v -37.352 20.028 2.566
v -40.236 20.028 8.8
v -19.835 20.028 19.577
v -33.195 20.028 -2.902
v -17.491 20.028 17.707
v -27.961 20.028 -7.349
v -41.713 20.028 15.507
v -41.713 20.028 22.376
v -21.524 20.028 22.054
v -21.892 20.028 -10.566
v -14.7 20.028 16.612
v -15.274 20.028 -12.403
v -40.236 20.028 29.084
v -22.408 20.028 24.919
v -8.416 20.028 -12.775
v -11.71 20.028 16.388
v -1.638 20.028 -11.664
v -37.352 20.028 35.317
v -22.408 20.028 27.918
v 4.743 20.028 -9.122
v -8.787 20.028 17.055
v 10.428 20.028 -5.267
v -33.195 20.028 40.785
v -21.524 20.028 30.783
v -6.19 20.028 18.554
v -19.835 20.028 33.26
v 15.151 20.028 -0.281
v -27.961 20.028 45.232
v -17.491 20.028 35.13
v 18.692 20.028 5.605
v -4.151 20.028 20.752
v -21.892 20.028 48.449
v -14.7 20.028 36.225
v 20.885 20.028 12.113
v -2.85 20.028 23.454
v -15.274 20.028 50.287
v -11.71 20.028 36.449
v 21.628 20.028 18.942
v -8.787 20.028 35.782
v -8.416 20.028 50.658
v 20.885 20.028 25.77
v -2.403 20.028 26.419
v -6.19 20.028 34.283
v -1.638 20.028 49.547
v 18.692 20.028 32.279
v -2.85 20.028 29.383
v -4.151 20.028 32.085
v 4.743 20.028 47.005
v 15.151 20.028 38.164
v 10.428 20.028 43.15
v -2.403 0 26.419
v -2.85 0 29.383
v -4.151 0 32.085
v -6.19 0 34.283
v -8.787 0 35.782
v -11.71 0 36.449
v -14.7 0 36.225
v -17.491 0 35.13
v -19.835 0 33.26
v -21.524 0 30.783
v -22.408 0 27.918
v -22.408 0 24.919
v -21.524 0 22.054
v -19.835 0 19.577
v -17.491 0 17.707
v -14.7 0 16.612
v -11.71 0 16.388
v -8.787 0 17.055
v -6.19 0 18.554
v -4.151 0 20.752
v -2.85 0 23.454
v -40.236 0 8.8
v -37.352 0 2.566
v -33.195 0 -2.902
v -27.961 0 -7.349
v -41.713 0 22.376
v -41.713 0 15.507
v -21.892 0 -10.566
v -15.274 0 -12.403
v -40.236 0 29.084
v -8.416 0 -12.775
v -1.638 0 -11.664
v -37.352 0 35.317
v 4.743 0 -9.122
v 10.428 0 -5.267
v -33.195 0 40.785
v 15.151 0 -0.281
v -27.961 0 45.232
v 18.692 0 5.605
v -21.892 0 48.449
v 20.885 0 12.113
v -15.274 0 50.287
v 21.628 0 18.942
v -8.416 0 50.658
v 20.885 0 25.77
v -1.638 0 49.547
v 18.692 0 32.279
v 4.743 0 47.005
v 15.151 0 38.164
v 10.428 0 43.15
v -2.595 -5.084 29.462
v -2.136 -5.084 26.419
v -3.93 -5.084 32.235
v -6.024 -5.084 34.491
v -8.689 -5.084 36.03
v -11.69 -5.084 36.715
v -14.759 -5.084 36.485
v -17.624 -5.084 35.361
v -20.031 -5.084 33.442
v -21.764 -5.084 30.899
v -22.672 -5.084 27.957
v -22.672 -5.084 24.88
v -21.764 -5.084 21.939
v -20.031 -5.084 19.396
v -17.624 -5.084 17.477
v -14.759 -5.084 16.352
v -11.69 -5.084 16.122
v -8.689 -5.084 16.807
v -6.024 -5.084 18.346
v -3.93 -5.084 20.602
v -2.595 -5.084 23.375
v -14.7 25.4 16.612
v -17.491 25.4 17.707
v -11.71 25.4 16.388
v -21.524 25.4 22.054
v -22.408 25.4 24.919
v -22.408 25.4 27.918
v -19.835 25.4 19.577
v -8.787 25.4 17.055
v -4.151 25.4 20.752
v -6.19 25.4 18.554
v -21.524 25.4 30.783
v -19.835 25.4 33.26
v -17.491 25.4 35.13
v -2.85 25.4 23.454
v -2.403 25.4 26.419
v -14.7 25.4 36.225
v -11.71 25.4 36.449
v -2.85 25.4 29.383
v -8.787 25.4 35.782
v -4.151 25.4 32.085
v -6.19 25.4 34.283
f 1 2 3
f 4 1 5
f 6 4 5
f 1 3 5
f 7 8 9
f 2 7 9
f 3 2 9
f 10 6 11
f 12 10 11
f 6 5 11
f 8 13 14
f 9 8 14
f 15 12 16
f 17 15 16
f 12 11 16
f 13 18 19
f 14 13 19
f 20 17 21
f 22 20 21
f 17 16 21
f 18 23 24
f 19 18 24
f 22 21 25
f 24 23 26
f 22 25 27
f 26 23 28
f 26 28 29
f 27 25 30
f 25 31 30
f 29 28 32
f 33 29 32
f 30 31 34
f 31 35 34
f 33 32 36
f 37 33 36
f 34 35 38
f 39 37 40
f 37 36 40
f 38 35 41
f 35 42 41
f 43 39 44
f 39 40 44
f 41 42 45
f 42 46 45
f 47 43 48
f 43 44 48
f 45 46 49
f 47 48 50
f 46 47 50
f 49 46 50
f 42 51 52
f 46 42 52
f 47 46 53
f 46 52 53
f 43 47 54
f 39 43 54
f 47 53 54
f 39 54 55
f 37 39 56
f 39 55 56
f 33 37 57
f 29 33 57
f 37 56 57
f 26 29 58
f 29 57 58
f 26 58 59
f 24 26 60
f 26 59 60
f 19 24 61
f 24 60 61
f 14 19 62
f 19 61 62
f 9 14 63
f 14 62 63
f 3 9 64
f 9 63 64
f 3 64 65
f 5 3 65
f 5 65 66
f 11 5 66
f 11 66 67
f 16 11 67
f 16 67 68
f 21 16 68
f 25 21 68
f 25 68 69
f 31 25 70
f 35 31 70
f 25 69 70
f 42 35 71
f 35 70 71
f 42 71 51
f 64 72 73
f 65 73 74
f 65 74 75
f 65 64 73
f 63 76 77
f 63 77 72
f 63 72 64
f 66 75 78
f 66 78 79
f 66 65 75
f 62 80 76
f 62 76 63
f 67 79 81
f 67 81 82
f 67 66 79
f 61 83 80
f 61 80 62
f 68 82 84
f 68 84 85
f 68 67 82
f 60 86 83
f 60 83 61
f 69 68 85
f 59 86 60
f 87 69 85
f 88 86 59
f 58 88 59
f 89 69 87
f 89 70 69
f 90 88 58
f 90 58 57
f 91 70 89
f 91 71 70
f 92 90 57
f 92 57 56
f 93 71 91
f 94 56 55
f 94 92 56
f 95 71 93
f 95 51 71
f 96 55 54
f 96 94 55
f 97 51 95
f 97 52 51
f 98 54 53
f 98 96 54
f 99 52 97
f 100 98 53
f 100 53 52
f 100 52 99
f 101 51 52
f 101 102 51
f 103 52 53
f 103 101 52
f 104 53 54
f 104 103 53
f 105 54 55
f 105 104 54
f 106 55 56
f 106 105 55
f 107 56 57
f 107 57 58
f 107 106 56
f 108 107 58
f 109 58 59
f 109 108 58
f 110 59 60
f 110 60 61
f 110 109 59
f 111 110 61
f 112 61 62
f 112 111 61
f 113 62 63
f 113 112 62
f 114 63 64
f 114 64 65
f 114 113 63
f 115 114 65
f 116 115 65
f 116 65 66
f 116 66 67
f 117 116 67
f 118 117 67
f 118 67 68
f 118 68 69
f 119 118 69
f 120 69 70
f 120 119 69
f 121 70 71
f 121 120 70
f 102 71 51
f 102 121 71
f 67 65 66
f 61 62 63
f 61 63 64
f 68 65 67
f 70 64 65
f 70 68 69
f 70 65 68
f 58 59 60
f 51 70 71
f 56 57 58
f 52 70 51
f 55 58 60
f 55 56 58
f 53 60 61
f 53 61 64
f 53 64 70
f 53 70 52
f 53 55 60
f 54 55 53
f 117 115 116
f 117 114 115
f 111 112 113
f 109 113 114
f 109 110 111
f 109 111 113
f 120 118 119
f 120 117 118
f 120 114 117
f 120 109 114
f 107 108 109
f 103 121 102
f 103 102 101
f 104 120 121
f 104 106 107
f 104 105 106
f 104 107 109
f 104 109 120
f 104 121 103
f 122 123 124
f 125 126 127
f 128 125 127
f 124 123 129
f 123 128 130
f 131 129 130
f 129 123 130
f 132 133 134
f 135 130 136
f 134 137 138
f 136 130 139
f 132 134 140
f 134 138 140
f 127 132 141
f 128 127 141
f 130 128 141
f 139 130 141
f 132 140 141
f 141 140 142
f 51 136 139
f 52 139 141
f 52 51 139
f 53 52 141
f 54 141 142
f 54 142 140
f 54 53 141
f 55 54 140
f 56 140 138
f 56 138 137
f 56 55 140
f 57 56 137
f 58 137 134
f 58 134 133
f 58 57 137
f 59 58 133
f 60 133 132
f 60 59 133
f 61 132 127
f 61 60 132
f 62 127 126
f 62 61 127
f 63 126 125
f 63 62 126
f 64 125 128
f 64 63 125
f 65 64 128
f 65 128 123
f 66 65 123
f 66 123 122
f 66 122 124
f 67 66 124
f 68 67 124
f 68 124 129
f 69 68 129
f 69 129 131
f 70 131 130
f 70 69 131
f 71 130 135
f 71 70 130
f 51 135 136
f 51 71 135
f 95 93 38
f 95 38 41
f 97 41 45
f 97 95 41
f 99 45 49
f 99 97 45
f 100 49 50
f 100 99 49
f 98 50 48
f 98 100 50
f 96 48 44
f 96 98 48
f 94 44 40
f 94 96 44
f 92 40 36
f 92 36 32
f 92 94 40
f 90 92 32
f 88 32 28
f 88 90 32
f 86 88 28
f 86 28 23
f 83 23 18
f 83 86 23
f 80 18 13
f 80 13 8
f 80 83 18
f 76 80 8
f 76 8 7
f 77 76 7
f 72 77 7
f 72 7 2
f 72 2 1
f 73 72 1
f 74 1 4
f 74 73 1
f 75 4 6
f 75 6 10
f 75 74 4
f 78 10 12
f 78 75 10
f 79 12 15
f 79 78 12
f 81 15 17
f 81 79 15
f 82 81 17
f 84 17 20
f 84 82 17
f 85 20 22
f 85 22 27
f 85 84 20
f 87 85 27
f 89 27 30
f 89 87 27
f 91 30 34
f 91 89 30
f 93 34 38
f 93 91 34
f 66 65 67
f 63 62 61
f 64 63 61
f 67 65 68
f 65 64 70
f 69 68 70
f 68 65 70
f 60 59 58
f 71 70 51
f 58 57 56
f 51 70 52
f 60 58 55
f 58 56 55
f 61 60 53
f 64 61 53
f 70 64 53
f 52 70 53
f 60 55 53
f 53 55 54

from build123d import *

# Parameters (mm, degrees)
F0_R     = 31.7633425833
F0_R_2   = 10.0588653516
F1_DEPTH = 20.0282335281
F2_R     = 10.0588653516
F3_DEPTH = 5.0843302161
F3_TAPER = -3
F4_DEPTH = 25.4


with BuildPart() as f1:
    # F0 (on Front) → F1 (new body)
    with BuildSketch(Plane.XZ):
        with Locations((-10.1354271173, 18.9416185021)):
            Circle(F0_R)
        with Locations((-12.4615877867, 26.4185667038)):
            Circle(F0_R_2, mode=Mode.SUBTRACT)
    extrude(amount=-F1_DEPTH)


with BuildPart() as f3:
    # F2 (on face) → F3 (new body)
    with BuildSketch(Plane.XZ):
        with Locations((-12.4615877867, 26.4185667038)):
            Circle(F2_R)
    extrude(amount=F3_DEPTH, taper=F3_TAPER)


with BuildPart() as f4:
    # F4 (new): a face of the model
    f4_faces = [f3.part.faces().sort_by_distance(p)[0] for p in [
        (-12.4615877867, 0, 26.4185667038),
    ]]
    extrude(f4_faces, amount=F4_DEPTH)


solid = Compound([f1.part, f3.part, f4.part])
